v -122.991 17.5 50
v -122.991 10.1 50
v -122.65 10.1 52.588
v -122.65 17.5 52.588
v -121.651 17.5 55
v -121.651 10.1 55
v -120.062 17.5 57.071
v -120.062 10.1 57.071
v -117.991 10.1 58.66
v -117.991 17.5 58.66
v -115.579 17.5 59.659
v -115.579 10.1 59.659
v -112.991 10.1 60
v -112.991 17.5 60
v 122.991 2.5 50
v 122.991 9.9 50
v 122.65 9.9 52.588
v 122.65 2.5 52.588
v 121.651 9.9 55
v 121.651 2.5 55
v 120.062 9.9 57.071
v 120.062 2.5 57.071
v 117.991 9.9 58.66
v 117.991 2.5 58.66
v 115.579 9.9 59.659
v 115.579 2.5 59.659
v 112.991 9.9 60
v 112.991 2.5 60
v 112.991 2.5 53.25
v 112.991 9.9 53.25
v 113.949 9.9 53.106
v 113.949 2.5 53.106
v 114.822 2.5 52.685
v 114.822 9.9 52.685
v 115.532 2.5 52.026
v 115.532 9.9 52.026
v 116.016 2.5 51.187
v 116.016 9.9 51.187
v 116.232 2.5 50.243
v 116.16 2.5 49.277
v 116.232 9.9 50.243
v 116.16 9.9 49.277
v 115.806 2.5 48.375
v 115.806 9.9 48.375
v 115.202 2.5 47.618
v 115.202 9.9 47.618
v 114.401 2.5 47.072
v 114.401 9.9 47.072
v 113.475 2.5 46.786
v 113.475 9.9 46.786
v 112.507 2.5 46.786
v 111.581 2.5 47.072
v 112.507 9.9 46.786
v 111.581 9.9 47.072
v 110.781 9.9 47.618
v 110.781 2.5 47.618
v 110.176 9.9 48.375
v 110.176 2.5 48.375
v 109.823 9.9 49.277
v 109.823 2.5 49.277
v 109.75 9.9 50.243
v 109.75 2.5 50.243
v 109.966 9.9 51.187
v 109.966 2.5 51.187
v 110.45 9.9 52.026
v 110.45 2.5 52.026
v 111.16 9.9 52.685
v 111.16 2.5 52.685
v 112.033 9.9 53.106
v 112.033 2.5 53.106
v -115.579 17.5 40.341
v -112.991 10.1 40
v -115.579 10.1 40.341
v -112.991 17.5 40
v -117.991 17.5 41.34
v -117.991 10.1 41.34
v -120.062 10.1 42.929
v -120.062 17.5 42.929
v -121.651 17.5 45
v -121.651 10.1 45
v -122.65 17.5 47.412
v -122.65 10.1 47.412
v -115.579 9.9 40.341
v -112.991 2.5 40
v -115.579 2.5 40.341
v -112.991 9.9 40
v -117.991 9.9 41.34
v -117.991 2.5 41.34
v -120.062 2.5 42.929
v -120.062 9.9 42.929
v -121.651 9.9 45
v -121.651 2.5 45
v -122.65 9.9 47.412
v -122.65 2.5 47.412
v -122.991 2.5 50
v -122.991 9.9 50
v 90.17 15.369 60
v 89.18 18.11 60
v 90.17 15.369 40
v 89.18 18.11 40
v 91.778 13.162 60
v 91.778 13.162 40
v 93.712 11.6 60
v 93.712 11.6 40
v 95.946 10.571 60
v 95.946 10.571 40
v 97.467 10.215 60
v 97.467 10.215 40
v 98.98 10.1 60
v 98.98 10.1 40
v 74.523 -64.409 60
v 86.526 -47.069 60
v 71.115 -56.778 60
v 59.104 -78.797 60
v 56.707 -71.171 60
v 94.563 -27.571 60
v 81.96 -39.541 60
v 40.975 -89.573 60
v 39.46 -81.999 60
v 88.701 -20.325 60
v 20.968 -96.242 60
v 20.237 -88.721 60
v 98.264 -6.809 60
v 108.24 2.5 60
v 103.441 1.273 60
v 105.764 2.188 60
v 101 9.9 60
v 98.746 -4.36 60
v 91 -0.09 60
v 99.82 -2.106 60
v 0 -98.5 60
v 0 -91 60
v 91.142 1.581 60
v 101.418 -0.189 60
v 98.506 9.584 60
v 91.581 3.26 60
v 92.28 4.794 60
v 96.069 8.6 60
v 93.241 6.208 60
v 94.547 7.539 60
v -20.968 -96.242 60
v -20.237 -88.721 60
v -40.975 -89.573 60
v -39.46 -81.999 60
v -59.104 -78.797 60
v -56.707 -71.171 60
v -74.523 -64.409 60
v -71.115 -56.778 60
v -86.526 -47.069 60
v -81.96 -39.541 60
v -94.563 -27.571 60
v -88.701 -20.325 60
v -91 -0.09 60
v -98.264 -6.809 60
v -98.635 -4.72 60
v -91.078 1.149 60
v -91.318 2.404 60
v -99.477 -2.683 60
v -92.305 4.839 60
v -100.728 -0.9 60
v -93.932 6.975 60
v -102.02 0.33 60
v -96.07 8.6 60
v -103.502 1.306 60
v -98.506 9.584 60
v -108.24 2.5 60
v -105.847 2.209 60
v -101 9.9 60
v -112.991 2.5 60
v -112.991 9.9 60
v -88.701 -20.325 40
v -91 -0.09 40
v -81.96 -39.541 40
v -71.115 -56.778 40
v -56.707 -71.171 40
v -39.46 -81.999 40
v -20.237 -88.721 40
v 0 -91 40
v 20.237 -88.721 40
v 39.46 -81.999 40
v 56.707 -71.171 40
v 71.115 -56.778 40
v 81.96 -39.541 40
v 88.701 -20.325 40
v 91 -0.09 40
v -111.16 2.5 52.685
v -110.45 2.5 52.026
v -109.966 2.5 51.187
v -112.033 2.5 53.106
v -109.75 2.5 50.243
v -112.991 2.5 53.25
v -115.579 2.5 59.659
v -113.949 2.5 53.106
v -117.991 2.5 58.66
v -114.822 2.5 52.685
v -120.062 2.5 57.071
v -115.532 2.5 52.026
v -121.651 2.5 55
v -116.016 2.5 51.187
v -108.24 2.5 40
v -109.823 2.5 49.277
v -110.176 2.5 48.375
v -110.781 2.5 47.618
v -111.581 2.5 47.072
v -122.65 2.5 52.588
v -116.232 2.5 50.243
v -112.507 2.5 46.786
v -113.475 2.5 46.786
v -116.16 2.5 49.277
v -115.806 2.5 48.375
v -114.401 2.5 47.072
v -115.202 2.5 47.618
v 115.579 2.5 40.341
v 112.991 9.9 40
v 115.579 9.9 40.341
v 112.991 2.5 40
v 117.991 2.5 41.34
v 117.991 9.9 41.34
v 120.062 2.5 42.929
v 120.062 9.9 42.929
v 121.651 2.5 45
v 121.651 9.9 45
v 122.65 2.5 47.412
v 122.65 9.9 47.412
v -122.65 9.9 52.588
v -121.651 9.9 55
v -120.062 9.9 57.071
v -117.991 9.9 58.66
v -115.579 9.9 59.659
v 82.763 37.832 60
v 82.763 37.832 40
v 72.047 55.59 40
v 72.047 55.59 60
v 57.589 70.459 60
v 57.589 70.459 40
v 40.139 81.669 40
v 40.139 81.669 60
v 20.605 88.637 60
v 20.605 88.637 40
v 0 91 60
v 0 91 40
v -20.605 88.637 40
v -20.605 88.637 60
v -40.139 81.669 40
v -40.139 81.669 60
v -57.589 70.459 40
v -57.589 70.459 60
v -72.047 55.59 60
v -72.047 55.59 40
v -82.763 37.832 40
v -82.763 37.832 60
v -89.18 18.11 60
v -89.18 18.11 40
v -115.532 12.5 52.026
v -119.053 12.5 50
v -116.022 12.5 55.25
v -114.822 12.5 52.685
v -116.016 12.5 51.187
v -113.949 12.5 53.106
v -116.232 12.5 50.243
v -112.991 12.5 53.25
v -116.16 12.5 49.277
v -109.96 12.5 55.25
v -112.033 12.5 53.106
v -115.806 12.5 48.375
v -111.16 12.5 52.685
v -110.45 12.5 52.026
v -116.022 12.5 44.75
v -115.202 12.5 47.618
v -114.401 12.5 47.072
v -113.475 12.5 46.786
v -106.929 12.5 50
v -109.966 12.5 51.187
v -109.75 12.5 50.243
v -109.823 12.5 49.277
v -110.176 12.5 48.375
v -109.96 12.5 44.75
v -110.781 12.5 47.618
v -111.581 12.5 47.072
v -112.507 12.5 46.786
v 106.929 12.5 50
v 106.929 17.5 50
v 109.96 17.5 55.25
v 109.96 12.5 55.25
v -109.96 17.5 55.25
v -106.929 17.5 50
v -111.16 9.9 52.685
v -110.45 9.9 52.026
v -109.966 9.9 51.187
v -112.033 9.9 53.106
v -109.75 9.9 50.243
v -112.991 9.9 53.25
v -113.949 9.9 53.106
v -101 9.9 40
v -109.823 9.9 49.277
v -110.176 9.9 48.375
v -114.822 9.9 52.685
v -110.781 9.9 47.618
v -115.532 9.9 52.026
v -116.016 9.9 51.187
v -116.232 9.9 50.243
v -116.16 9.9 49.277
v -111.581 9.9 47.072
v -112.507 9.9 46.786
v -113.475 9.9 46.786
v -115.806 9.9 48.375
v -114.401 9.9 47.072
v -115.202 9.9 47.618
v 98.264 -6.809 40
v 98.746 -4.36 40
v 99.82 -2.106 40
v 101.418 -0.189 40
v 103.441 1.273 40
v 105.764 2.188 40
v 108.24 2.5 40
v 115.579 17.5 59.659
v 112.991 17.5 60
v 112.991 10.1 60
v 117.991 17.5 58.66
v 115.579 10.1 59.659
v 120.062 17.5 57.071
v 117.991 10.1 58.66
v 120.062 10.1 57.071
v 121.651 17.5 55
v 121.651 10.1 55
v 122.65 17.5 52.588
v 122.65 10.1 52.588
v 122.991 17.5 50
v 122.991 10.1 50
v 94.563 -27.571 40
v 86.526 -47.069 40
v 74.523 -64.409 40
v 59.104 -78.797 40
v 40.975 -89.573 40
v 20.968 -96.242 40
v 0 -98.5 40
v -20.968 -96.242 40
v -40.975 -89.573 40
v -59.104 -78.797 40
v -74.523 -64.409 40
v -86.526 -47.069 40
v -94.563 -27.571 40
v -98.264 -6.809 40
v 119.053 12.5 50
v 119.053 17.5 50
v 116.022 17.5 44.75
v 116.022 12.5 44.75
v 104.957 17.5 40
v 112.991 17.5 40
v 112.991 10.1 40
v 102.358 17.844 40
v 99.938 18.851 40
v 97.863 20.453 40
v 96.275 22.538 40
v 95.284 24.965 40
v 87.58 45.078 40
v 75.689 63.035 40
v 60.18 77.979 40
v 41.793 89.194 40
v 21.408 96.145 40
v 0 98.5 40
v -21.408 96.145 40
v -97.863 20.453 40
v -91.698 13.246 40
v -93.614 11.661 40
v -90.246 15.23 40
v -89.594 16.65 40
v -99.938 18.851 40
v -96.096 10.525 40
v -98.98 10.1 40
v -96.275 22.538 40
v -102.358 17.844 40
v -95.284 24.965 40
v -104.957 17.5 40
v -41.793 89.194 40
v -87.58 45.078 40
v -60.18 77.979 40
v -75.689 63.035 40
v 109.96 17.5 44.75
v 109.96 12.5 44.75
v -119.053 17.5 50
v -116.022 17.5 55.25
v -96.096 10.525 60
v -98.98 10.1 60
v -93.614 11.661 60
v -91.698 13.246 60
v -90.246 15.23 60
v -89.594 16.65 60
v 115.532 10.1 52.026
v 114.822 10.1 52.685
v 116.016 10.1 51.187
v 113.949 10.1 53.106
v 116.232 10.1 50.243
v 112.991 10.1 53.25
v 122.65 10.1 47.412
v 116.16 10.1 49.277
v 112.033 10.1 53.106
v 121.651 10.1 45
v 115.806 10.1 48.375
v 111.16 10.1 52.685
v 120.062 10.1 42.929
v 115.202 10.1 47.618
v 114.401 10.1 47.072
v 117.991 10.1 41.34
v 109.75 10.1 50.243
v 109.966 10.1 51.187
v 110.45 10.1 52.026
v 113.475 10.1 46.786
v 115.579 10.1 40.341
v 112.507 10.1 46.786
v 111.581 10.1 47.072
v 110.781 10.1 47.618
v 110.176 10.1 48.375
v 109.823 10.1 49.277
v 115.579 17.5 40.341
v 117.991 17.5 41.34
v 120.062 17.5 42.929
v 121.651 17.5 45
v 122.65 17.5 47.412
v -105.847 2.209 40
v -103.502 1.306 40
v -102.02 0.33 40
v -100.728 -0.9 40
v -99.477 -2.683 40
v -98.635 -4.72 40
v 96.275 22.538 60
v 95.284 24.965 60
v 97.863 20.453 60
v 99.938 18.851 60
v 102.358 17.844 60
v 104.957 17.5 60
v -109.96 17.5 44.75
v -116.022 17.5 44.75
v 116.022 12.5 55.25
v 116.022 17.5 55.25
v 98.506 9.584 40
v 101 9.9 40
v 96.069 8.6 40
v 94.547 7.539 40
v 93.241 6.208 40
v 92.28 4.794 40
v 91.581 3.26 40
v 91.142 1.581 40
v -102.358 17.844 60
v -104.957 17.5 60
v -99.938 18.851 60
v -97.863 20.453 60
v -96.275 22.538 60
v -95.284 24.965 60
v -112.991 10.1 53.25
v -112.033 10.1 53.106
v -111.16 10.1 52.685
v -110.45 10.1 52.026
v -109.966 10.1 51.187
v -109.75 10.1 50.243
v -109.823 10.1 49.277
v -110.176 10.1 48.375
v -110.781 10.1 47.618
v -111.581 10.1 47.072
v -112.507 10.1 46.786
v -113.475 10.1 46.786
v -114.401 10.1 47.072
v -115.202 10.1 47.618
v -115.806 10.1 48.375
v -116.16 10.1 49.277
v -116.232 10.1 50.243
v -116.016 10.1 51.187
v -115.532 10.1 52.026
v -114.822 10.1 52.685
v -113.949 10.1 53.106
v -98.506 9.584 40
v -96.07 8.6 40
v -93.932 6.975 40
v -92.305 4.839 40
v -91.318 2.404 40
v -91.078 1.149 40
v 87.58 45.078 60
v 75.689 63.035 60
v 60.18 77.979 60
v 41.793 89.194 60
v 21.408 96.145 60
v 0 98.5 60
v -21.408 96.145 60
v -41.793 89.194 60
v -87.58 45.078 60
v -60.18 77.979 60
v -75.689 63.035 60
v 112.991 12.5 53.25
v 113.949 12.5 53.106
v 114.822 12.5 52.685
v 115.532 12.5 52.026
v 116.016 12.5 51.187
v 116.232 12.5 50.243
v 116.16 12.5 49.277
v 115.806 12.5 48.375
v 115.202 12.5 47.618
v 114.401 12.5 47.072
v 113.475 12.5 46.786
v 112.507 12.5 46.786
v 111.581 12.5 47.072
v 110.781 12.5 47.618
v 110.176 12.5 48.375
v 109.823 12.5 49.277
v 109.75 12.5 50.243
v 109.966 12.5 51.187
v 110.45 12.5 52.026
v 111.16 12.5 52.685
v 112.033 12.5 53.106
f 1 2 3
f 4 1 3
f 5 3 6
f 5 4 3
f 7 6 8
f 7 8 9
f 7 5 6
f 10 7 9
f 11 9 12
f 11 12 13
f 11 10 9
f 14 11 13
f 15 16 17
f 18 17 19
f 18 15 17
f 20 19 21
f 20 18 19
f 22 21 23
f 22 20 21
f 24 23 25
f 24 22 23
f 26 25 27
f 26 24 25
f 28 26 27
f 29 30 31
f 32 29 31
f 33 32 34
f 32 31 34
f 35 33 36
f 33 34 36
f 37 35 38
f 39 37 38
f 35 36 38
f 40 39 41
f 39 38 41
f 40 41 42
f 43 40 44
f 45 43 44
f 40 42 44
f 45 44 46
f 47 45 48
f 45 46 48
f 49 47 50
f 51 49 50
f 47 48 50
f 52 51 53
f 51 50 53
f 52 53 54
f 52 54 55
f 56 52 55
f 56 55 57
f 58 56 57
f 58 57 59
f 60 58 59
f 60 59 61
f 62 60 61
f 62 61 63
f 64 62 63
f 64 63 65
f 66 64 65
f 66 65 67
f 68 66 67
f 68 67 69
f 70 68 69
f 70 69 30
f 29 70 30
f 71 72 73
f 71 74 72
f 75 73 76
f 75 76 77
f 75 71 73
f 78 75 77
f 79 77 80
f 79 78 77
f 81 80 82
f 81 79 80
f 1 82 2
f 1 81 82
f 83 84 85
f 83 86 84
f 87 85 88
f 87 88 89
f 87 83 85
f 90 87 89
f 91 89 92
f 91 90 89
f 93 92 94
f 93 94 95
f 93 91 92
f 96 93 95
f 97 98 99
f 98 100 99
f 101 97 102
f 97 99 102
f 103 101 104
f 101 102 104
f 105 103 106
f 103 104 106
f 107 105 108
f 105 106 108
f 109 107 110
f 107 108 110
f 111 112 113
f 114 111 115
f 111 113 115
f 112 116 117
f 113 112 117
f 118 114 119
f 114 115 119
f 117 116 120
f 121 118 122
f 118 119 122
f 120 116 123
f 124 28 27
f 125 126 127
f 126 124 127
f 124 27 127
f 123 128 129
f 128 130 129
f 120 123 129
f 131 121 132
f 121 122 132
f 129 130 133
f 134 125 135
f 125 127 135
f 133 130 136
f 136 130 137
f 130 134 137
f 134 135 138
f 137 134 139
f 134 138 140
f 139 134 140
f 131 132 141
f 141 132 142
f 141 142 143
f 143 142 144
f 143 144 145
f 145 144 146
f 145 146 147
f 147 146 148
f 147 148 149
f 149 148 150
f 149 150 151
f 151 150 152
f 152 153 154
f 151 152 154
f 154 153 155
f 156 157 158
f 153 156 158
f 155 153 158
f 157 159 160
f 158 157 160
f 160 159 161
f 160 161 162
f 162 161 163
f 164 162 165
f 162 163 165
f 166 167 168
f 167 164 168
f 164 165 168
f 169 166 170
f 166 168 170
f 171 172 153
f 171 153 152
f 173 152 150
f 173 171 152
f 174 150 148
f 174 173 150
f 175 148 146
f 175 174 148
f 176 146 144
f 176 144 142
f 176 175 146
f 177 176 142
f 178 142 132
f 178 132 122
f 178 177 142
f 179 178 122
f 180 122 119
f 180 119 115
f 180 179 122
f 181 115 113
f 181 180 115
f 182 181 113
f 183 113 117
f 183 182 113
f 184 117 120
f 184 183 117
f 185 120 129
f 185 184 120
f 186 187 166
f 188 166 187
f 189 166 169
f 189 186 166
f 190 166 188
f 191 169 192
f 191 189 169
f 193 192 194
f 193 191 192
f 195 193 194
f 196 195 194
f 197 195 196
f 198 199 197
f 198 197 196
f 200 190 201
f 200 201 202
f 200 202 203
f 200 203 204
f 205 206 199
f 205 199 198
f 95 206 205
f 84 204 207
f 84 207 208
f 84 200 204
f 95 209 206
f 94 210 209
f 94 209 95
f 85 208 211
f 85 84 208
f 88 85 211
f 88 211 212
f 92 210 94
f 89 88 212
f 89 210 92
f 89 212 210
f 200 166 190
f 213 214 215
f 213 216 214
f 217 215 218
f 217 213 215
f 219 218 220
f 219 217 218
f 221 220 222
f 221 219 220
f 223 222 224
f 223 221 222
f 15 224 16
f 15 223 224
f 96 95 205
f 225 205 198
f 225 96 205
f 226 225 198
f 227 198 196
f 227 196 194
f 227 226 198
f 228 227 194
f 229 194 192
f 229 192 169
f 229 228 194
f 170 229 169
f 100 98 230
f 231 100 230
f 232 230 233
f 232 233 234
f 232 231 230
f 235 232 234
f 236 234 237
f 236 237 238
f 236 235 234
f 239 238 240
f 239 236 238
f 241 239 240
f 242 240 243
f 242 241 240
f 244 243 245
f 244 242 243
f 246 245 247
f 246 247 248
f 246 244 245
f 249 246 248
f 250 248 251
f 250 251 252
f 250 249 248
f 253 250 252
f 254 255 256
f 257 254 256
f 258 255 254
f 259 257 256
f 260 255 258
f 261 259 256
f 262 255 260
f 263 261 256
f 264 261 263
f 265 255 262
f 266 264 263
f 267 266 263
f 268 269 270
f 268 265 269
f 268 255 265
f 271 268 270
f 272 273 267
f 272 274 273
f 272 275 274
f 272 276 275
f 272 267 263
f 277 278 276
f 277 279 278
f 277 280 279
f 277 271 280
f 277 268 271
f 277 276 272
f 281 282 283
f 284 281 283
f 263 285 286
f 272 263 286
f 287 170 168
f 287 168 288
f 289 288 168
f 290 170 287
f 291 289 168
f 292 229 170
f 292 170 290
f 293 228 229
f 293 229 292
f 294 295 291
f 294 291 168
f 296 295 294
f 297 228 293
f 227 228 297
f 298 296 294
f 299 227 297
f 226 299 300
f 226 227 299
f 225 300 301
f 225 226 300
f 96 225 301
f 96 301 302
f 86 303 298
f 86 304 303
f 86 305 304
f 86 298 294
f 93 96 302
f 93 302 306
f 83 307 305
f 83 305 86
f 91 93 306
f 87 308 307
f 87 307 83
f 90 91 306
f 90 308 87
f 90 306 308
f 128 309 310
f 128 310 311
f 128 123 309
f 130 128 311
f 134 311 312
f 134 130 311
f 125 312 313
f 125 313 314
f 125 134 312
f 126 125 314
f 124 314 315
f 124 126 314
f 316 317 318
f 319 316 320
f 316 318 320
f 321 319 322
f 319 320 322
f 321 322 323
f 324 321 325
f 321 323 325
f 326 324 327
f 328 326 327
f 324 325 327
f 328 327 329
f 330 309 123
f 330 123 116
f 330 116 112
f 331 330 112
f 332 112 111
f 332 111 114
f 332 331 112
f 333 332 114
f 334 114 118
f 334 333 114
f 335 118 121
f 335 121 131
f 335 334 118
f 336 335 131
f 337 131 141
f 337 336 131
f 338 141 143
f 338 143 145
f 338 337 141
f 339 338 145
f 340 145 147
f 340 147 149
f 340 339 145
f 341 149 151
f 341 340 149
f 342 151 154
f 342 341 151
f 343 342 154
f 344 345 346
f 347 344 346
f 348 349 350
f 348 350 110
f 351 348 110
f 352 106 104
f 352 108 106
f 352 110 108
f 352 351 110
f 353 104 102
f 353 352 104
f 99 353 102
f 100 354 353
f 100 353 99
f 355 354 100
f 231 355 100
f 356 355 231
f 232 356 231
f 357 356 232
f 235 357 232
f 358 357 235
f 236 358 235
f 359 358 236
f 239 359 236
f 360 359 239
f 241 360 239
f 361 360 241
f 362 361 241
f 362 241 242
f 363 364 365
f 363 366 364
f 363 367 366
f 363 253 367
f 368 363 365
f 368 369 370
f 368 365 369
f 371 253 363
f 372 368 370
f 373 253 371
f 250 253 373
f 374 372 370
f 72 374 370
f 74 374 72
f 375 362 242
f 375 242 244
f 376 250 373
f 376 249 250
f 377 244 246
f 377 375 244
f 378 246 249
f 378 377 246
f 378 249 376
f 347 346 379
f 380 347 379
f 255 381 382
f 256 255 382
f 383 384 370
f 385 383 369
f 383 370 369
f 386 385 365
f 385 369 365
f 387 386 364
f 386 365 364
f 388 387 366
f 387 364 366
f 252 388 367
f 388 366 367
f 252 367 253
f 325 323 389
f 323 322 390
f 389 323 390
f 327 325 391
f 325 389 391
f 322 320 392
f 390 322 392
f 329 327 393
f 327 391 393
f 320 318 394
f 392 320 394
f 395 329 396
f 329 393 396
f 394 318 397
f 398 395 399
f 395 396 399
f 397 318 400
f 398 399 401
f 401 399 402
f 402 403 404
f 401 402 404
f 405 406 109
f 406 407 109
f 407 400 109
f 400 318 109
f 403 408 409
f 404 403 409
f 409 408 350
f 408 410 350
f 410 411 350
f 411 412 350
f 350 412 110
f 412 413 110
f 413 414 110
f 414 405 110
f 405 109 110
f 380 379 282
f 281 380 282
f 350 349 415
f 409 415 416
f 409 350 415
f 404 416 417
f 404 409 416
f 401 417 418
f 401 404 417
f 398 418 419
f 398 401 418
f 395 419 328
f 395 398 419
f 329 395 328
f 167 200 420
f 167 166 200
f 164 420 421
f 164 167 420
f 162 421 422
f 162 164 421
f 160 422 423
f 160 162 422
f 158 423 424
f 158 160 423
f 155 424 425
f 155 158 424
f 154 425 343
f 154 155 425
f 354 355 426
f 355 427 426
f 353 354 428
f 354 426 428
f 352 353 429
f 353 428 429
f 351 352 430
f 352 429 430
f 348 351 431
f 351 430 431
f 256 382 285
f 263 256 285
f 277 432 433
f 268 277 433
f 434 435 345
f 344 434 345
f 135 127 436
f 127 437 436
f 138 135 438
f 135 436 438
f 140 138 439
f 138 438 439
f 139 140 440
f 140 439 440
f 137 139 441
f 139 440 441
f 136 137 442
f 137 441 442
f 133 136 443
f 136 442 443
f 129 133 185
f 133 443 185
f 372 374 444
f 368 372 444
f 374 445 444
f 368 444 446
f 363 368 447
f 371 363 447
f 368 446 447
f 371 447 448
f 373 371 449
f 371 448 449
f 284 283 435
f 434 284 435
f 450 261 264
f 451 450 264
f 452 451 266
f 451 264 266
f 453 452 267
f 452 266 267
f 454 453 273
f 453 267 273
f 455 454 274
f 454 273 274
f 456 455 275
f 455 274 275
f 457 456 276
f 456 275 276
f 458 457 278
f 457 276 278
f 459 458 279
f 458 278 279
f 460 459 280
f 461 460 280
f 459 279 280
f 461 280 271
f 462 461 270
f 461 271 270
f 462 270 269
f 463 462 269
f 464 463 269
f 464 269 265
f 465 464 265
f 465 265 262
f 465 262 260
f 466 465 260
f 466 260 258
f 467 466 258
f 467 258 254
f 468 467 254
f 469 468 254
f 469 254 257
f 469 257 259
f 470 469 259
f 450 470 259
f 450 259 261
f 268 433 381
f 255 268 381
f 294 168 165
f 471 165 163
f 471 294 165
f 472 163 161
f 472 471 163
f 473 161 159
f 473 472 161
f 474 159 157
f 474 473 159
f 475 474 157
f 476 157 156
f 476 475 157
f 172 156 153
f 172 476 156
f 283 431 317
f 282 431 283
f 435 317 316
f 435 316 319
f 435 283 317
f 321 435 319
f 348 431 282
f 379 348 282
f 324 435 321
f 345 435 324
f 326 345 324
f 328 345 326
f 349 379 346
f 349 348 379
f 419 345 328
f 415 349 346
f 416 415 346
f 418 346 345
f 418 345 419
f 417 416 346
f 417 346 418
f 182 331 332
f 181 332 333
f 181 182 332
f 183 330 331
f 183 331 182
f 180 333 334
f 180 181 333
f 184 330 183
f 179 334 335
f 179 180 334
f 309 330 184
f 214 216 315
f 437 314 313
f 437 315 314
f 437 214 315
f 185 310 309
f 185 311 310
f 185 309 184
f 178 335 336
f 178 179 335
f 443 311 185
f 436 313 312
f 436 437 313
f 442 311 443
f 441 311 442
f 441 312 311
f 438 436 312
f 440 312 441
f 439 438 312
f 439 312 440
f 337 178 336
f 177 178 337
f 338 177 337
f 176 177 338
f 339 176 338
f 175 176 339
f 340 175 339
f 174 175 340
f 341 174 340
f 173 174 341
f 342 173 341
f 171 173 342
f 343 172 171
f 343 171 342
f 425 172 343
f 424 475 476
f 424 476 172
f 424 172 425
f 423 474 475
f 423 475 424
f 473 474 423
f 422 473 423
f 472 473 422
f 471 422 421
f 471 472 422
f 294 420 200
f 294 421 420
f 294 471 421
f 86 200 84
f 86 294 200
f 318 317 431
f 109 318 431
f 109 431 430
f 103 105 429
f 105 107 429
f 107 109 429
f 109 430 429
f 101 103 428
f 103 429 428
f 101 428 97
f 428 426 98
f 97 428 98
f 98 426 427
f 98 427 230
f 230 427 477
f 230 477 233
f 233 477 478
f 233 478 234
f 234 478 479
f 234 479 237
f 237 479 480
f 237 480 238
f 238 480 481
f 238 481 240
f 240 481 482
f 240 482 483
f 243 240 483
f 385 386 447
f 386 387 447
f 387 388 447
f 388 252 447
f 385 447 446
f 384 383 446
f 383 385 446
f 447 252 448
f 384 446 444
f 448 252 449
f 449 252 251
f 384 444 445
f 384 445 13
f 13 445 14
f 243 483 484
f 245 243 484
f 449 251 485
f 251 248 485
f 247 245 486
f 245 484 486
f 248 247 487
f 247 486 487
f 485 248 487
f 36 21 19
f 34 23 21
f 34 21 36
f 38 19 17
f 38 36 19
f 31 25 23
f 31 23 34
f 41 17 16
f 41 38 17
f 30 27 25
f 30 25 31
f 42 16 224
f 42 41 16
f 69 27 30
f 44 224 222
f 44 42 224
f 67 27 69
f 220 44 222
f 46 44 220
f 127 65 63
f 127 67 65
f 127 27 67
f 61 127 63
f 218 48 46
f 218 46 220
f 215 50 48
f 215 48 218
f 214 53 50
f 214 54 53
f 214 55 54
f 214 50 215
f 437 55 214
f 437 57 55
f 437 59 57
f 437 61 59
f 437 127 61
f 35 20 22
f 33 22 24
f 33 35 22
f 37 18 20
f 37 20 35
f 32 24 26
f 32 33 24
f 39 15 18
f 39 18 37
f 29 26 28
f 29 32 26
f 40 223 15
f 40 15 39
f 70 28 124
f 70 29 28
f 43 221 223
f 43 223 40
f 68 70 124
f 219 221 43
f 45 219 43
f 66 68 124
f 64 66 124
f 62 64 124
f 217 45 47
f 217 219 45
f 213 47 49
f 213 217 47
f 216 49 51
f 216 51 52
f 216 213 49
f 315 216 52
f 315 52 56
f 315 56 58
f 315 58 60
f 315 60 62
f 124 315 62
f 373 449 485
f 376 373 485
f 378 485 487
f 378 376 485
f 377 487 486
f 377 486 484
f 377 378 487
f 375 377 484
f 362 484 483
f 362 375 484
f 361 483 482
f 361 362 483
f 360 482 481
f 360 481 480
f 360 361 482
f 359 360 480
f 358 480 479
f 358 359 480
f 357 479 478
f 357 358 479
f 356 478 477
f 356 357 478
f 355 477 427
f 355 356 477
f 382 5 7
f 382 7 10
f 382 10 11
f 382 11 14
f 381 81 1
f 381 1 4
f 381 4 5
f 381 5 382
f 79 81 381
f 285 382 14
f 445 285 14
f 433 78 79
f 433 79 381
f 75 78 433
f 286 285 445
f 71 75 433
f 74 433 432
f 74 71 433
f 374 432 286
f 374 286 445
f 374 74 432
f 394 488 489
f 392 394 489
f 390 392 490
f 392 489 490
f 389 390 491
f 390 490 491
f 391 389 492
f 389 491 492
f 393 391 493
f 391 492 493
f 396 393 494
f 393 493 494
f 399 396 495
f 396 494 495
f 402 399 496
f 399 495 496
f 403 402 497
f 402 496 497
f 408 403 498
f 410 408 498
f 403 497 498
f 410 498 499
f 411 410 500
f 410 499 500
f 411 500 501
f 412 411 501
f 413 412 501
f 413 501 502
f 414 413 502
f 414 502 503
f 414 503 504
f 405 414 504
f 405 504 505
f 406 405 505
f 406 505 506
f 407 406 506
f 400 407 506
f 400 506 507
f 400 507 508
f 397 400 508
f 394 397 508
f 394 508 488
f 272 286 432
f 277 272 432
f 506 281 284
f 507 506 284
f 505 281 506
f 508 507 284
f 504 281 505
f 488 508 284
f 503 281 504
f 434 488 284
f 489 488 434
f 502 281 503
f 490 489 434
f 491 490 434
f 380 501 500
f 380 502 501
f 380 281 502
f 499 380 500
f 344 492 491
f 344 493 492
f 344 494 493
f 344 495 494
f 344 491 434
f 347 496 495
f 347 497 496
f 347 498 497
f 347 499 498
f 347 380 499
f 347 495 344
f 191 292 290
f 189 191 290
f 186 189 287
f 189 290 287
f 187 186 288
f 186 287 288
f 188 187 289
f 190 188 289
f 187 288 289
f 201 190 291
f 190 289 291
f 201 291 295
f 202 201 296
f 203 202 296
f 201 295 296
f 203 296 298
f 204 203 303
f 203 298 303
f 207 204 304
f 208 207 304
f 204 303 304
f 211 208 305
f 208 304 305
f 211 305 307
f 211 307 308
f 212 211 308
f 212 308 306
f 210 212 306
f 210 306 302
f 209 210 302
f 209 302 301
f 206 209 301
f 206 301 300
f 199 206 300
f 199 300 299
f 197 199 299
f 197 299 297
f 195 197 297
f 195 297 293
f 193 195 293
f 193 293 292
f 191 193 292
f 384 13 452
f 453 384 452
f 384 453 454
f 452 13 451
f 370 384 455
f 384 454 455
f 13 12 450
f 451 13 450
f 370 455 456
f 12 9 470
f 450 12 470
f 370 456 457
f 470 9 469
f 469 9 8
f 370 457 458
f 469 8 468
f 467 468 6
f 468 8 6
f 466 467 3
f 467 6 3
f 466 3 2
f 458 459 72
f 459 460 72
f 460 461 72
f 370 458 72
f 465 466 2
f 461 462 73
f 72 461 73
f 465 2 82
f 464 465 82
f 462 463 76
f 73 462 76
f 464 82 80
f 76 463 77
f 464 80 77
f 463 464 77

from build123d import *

# Parameters (mm, degrees)
BOSS_EXTRUDE1_DEPTH     = 20
CUT_EXTRUDE1_DEPTH      = 272.678972695
CUT_EXTRUDE1_DEPTH_BACK = 272.678972695
SKETCH3_W               = 20
SKETCH3_H               = 0.2
FILLET1_R               = 10
FILLET2_R               = 10
FILLET3_R               = 10
FILLET4_R               = 10
CUT_EXTRUDE2_DEPTH      = 5
SKETCH5_R               = 3.25
CUT_EXTRUDE3_DEPTH      = 177.203869452


with BuildPart() as part:
    # Sketch2 → Boss-Extrude1 (new body)
    with BuildSketch(Plane(origin=(0, 0, 40), x_dir=(-1, 0, 0), z_dir=(0, 0, -1))):
        with BuildLine():
            Line((97.991071022, 10), (122.991071022, 10))
            Line((122.991071022, 10), (122.991071022, 17.5))
            Line((122.991071022, 17.5), (96.932966528, 17.5))
            ThreePointArc((96.932966528, 17.5), (97.534135582, 13.760174282), (97.991071022, 10))
        make_face()
        with BuildLine():
            Line((90.44888059, 10), (97.991071022, 10))
            ThreePointArc((97.991071022, 10), (97.534135582, 13.760174282), (96.932966528, 17.5))
            Line((96.932966528, 17.5), (89.301455755, 17.5))
            ThreePointArc((89.301455755, 17.5), (89.953367664, 13.761963738), (90.44888059, 10))
        make_face()
        with BuildLine():
            Line((89.301455755, 17.5), (96.932966528, 17.5))
            ThreePointArc((96.932966528, 17.5), (0, 98.5), (-96.932966528, 17.5))
            Line((-96.932966528, 17.5), (-89.301455755, 17.5))
            ThreePointArc((-89.301455755, 17.5), (0, 91), (89.301455755, 17.5))
        make_face()
        with BuildLine():
            Line((90.965652859, 2.5), (98.468269001, 2.5))
            ThreePointArc((98.468269001, 2.5), (98.301223647, 6.2545527), (97.991071022, 10))
            Line((97.991071022, 10), (90.44888059, 10))
            ThreePointArc((90.44888059, 10), (90.784749472, 6.255338791), (90.965652859, 2.5))
        make_face()
        with BuildLine():
            Line((98.468269001, 2.5), (122.991071022, 2.5))
            Line((122.991071022, 2.5), (122.991071022, 10))
            Line((122.991071022, 10), (97.991071022, 10))
            ThreePointArc((97.991071022, 10), (98.301223647, 6.2545527), (98.468269001, 2.5))
        make_face()
        with BuildLine():
            ThreePointArc((98.5, 0), (98.492066931, 1.250100682), (98.468269001, 2.5))
            Line((98.468269001, 2.5), (90.965652859, 2.5))
            ThreePointArc((90.965652859, 2.5), (90.991412809, 1.250117967), (91, 0))
            ThreePointArc((91, 0), (-1.250117967, -90.991412809), (-90.965652859, 2.5))
            Line((-90.965652859, 2.5), (-98.468269001, 2.5))
            ThreePointArc((-98.468269001, 2.5), (-1.250100682, -98.492066931), (98.5, 0))
        make_face()
        with BuildLine():
            Line((-98.468269001, 2.5), (-90.965652859, 2.5))
            ThreePointArc((-90.965652859, 2.5), (-90.784749472, 6.255338791), (-90.44888059, 10))
            Line((-90.44888059, 10), (-97.991071022, 10))
            ThreePointArc((-97.991071022, 10), (-98.301223647, 6.2545527), (-98.468269001, 2.5))
        make_face()
        with BuildLine():
            Line((-97.991071022, 10), (-90.44888059, 10))
            ThreePointArc((-90.44888059, 10), (-89.953367664, 13.761963738), (-89.301455755, 17.5))
            Line((-89.301455755, 17.5), (-96.932966528, 17.5))
            ThreePointArc((-96.932966528, 17.5), (-97.534135582, 13.760174282), (-97.991071022, 10))
        make_face()
        with BuildLine():
            Line((-122.991071022, 10), (-97.991071022, 10))
            ThreePointArc((-97.991071022, 10), (-97.534135582, 13.760174282), (-96.932966528, 17.5))
            Line((-96.932966528, 17.5), (-122.991071022, 17.5))
            Line((-122.991071022, 17.5), (-122.991071022, 10))
        make_face()
        with BuildLine():
            Line((-122.991071022, 2.5), (-98.468269001, 2.5))
            ThreePointArc((-98.468269001, 2.5), (-98.301223647, 6.2545527), (-97.991071022, 10))
            Line((-97.991071022, 10), (-122.991071022, 10))
            Line((-122.991071022, 10), (-122.991071022, 2.5))
        make_face()
    extrude(amount=-BOSS_EXTRUDE1_DEPTH)

    # Sketch3 → Cut-Extrude1 (cut, two sides: drawn at the far end of the back side and taken through both)
    with BuildSketch(Plane(origin=(122.991071022, 0, 0), x_dir=(0, 0, -1), z_dir=(1, 0, 0)).offset(-CUT_EXTRUDE1_DEPTH_BACK)):
        with Locations((-50, 10)):
            Rectangle(SKETCH3_W, SKETCH3_H)
    extrude(amount=CUT_EXTRUDE1_DEPTH + CUT_EXTRUDE1_DEPTH_BACK, mode=Mode.SUBTRACT)


with BuildPart() as cut_extrude1_piece_1:
    # of the separate pieces the step leaves, piece 1, a body of its own (cut_extrude1_pieces)
    add(part.part.solids().sort_by_distance((-122.991071022, 2.5, 40))[0])

    # Fillet2
    fillet2_edges = [cut_extrude1_piece_1.edges().sort_by_distance(p)[0] for p in [
        (-98.468269001, 2.5, 50),
        (98.468269001, 2.5, 50),
        (90.45988061, 9.9, 50),
        (-90.45988061, 9.9, 50),
    ]]
    fillet(fillet2_edges, radius=FILLET2_R)

    # Fillet3
    fillet3_edges = [cut_extrude1_piece_1.edges().sort_by_distance(p)[0] for p in [
        (122.991071022, 6.2, 60),
        (-122.991071022, 6.2, 40),
        (-122.991071022, 6.2, 60),
        (122.991071022, 6.2, 40),
    ]]
    fillet(fillet3_edges, radius=FILLET3_R - 0.0001)  # a hair under: the kernel refuses the full size


with BuildPart() as cut_extrude1_piece_2:
    # of the separate pieces the step leaves, piece 2, a body of its own (cut_extrude1_pieces)
    add(part.part.solids().sort_by_distance((-122.991071022, 10.1, 40))[0])

    # Fillet1
    fillet1_edges = [cut_extrude1_piece_2.edges().sort_by_distance(p)[0] for p in [
        (96.932966528, 17.5, 50),
        (-96.932966528, 17.5, 50),
        (90.437768659, 10.1, 50),
        (-90.437768659, 10.1, 50),
    ]]
    fillet(fillet1_edges, radius=FILLET1_R)

    # Fillet4
    fillet4_edges = [cut_extrude1_piece_2.edges().sort_by_distance(p)[0] for p in [
        (-122.991071022, 13.8, 60),
        (-122.991071022, 13.8, 40),
        (122.991071022, 13.8, 60),
        (122.991071022, 13.8, 40),
    ]]
    fillet(fillet4_edges, radius=FILLET4_R - 0.0001)  # a hair under: the kernel refuses the full size

    # Sketch4 → Cut-Extrude2 (cut)
    with BuildSketch(Plane(origin=(0, 17.5, 0), x_dir=(1, 0, 0), z_dir=(0, 1, 0))):
        Polygon((109.959982109, -55.25), (116.022159935, -55.25), (119.053248848, -50), (116.022159935, -44.75), (109.959982109, -44.75), (106.928893195, -50), align=None)
        Polygon((-106.928893195, -50), (-109.959982109, -44.75), (-116.022159935, -44.75), (-119.053248848, -50), (-116.022159935, -55.25), (-109.959982109, -55.25), align=None)
    extrude(amount=-CUT_EXTRUDE2_DEPTH, mode=Mode.SUBTRACT)


with BuildPart() as cut_extrude3_tool:
    # Sketch5 → Cut-Extrude3 (new, through all)
    with BuildSketch(Plane(origin=(0, 12.5, 0), x_dir=(1, 0, 0), z_dir=(0, 1, 0))):
        with Locations(Location((-112.991071022, -50, 0), (0, 0, 270))):
            Circle(SKETCH5_R)
        with Locations(Location((112.991071022, -50, 0), (0, 0, 270))):
            Circle(SKETCH5_R)
    extrude(amount=-CUT_EXTRUDE3_DEPTH)


with BuildPart() as cut_extrude1_piece_1_1:
    add(cut_extrude1_piece_1.part)

    # Cut-Extrude3: cut by cut_extrude3_tool
    add(cut_extrude3_tool.part, mode=Mode.SUBTRACT)


with BuildPart() as cut_extrude1_piece_2_1:
    add(cut_extrude1_piece_2.part)

    # Cut-Extrude3: cut by cut_extrude3_tool
    add(cut_extrude3_tool.part, mode=Mode.SUBTRACT)


solid = Compound([cut_extrude1_piece_1_1.part, cut_extrude1_piece_2_1.part])
